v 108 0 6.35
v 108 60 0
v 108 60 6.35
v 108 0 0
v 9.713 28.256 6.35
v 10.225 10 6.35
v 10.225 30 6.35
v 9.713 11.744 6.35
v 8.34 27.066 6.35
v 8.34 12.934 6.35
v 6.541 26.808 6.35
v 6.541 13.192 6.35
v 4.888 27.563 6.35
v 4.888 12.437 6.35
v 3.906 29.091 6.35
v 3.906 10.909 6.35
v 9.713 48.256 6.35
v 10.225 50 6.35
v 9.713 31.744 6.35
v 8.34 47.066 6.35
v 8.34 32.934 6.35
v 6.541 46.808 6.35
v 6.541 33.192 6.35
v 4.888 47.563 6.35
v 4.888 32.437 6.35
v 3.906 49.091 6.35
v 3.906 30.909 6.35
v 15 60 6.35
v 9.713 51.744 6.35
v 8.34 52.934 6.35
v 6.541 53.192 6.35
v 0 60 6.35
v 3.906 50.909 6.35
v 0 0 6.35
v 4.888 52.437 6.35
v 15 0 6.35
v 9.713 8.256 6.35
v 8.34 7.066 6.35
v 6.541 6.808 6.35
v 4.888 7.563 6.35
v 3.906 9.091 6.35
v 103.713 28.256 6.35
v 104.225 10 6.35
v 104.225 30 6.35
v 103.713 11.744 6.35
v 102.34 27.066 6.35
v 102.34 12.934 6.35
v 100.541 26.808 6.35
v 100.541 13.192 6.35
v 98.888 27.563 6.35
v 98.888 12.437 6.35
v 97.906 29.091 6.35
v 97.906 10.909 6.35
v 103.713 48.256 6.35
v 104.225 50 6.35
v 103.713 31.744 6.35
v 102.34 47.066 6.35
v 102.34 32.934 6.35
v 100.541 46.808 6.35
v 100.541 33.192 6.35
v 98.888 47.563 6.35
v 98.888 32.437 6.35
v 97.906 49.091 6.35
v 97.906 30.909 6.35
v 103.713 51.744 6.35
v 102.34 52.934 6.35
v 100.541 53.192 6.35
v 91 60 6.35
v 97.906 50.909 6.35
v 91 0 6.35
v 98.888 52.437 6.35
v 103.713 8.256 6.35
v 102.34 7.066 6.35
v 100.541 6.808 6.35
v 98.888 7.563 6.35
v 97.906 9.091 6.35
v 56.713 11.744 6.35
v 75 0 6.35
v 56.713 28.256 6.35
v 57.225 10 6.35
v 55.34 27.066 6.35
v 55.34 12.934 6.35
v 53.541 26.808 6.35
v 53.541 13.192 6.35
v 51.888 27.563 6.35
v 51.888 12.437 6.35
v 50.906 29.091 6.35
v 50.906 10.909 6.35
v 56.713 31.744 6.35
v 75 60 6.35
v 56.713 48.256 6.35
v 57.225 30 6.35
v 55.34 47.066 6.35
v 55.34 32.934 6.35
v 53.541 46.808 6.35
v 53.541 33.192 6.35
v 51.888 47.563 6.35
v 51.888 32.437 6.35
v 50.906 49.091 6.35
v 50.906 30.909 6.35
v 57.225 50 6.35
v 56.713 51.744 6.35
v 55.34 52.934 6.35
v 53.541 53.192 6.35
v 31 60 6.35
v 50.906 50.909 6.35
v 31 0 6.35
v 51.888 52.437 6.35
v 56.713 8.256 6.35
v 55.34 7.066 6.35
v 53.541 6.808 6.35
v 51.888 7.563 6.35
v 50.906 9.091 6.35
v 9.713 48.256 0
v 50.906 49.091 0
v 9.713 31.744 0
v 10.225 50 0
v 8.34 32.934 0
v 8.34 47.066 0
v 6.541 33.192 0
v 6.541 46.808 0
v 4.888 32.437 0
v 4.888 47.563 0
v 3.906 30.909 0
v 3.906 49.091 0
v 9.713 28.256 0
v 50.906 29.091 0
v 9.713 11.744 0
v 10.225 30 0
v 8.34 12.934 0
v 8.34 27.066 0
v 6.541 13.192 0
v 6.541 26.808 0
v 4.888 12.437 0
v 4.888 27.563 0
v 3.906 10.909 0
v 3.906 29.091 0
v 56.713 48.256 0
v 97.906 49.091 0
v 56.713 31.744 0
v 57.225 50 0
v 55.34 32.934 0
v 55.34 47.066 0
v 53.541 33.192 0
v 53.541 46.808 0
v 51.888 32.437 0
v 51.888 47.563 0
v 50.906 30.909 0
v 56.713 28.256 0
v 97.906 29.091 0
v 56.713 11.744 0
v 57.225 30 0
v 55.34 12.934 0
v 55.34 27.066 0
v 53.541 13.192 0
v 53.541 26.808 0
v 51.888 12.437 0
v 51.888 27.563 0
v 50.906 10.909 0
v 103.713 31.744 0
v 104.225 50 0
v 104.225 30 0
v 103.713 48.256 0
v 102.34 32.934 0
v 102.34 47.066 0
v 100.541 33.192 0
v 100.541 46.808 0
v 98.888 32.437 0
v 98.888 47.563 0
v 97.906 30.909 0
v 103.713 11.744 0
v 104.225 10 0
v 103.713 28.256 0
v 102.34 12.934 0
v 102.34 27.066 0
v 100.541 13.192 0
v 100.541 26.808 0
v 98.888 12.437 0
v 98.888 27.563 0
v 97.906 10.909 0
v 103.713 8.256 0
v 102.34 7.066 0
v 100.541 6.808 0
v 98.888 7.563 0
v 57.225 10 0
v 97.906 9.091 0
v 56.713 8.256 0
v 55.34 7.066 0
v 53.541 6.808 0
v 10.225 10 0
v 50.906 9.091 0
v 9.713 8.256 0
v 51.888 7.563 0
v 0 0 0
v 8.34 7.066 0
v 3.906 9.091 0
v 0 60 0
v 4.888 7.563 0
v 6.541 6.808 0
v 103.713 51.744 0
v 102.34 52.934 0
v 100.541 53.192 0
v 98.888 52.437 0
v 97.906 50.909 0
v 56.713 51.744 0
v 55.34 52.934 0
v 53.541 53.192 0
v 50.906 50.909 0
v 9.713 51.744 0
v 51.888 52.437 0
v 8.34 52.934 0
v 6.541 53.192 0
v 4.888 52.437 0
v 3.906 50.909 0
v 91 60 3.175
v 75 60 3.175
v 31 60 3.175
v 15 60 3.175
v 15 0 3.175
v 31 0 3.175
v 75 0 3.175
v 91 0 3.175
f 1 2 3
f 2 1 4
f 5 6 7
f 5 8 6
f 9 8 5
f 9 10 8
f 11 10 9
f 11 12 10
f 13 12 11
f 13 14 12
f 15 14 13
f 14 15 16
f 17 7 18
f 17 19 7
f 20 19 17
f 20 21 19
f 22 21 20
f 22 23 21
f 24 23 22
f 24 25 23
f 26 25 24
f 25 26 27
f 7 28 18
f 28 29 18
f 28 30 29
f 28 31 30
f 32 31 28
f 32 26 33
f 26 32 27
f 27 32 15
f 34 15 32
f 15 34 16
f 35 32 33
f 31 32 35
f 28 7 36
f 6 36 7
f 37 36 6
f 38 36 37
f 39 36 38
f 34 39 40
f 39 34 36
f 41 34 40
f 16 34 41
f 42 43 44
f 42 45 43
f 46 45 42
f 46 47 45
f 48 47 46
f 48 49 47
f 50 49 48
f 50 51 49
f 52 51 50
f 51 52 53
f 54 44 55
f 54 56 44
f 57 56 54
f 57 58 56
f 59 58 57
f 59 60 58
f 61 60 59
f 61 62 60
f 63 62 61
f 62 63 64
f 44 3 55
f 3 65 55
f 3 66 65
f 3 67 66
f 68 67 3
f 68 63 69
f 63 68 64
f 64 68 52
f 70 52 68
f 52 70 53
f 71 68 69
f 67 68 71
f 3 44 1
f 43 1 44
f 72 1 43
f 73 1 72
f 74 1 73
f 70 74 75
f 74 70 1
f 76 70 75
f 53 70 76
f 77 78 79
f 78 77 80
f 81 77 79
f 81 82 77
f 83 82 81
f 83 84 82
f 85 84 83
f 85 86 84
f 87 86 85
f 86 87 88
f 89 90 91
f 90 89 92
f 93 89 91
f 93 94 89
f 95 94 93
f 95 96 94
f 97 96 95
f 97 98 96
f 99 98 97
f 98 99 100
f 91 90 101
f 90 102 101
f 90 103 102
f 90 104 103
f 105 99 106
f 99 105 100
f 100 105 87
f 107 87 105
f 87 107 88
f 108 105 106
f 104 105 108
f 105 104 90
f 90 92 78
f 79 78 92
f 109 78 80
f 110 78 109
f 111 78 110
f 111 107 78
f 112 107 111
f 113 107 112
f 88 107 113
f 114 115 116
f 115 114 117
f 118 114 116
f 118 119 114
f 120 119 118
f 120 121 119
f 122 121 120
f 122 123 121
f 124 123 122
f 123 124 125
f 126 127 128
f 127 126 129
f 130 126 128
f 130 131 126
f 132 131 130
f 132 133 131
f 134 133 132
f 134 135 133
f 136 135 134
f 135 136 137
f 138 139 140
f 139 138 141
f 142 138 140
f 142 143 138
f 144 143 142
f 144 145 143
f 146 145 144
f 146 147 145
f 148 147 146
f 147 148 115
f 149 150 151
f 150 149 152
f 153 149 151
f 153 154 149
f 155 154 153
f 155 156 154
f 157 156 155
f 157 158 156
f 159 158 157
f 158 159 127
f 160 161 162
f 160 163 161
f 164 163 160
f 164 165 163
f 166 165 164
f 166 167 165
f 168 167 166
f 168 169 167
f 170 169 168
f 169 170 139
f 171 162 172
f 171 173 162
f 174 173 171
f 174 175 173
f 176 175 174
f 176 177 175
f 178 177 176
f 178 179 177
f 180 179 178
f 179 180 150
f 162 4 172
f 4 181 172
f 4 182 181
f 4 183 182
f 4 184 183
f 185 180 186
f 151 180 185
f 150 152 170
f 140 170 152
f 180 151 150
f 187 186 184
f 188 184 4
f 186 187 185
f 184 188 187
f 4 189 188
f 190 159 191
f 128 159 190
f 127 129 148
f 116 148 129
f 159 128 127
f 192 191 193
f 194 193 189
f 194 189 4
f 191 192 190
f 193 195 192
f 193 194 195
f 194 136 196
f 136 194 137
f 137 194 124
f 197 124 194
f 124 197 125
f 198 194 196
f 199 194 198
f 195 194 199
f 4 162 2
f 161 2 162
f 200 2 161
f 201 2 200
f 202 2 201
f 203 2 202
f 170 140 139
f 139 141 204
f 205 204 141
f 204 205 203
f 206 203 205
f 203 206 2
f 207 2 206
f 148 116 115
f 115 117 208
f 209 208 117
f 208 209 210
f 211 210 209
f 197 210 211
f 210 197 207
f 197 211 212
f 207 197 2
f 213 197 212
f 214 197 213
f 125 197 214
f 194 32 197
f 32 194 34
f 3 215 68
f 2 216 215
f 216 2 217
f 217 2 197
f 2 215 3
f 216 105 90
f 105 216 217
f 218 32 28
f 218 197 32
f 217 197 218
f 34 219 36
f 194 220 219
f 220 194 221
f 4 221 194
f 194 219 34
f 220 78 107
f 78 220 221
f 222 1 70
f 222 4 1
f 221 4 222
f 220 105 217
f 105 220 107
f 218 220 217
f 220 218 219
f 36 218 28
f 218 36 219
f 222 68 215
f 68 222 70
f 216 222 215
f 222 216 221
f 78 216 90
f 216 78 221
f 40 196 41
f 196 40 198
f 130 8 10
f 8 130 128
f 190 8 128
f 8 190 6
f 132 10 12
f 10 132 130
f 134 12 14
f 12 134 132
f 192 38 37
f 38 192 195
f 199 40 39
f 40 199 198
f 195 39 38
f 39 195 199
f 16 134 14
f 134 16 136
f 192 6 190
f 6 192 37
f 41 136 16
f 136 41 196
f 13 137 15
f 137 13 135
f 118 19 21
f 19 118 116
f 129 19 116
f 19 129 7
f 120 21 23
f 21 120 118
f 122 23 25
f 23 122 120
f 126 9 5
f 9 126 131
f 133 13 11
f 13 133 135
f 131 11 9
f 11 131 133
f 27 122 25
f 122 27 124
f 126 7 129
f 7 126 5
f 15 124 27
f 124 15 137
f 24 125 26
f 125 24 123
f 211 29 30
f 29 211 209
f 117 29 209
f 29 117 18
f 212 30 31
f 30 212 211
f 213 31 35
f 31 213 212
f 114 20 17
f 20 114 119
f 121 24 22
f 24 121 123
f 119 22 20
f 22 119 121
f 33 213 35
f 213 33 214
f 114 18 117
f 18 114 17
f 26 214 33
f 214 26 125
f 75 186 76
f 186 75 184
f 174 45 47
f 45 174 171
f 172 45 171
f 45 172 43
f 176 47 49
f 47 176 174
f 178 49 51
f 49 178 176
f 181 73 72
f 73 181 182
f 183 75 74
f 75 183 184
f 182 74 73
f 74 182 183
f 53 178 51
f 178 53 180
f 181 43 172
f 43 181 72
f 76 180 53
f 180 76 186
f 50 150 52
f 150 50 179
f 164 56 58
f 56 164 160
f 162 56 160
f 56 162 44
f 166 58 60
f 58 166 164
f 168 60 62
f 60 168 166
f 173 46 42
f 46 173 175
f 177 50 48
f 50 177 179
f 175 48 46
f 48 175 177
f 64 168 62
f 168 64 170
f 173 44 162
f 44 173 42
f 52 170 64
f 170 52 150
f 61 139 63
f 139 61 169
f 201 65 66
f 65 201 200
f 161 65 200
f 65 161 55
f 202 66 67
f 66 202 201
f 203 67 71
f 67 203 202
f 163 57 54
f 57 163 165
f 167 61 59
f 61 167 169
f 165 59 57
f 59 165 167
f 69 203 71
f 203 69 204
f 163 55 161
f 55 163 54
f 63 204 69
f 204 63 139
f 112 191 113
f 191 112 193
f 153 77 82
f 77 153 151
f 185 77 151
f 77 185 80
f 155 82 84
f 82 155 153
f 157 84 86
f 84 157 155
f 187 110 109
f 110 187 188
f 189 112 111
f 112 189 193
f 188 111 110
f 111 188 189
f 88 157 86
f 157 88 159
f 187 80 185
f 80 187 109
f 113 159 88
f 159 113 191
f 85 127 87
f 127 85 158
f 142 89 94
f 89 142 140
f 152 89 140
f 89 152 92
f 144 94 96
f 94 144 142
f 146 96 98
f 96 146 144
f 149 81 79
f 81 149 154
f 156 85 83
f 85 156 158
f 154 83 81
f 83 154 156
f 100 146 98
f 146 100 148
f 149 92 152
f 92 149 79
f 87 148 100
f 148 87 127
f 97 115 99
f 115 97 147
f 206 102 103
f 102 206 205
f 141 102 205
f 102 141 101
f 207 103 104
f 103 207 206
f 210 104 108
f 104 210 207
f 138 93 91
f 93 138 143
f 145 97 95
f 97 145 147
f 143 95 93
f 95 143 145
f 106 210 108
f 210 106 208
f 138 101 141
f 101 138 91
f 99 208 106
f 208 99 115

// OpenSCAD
$inch = 25.4;
$plate_thick = $inch/4;
$half_inch = $inch/2;
$q_inch = $inch/4;
$slot_width = 16;
$slot_center_to_center = 60;
$first_slot_offset = 15;
$2nd_slot_offset = $first_slot_offset + $slot_center_to_center;
$r_bolt = $q_inch/2 + 0.05;


module top_half () {
    difference () {
       cube([108, 60, 6.35]);
         translate([$first_slot_offset,-1,$q_inch/2])  {
            cube([$slot_width, 62, 6.35]);
         }
         translate([$2nd_slot_offset,-1,$q_inch/2])  {
            cube([$slot_width, 62, 6.35]);
         }
         translate([7,10,-0.5]) {
             cylinder(r=$r_bolt,h=7);
         }
         translate([7,30,-0.5]) {
             cylinder(r=$r_bolt,h=7);
         }
         translate([7,50,-0.5]) {
             cylinder(r=$r_bolt,h=7);
         }
         translate([101,10,-0.5]) {
             cylinder(r=$r_bolt,h=7);
         }
         translate([101,30,-0.5]) {
             cylinder(r=$r_bolt,h=7);
         }
         translate([101,50,-0.5]) {
             cylinder(r=$r_bolt,h=7);
         }
         translate([54,10,-0.5]) {
             cylinder(r=$r_bolt,h=7);
         }
         translate([54,30,-0.5]) {
             cylinder(r=$r_bolt,h=7);
         }
         translate([54,50,-0.5]) {
             cylinder(r=$r_bolt,h=7);
         }
   }
}


top_half();
